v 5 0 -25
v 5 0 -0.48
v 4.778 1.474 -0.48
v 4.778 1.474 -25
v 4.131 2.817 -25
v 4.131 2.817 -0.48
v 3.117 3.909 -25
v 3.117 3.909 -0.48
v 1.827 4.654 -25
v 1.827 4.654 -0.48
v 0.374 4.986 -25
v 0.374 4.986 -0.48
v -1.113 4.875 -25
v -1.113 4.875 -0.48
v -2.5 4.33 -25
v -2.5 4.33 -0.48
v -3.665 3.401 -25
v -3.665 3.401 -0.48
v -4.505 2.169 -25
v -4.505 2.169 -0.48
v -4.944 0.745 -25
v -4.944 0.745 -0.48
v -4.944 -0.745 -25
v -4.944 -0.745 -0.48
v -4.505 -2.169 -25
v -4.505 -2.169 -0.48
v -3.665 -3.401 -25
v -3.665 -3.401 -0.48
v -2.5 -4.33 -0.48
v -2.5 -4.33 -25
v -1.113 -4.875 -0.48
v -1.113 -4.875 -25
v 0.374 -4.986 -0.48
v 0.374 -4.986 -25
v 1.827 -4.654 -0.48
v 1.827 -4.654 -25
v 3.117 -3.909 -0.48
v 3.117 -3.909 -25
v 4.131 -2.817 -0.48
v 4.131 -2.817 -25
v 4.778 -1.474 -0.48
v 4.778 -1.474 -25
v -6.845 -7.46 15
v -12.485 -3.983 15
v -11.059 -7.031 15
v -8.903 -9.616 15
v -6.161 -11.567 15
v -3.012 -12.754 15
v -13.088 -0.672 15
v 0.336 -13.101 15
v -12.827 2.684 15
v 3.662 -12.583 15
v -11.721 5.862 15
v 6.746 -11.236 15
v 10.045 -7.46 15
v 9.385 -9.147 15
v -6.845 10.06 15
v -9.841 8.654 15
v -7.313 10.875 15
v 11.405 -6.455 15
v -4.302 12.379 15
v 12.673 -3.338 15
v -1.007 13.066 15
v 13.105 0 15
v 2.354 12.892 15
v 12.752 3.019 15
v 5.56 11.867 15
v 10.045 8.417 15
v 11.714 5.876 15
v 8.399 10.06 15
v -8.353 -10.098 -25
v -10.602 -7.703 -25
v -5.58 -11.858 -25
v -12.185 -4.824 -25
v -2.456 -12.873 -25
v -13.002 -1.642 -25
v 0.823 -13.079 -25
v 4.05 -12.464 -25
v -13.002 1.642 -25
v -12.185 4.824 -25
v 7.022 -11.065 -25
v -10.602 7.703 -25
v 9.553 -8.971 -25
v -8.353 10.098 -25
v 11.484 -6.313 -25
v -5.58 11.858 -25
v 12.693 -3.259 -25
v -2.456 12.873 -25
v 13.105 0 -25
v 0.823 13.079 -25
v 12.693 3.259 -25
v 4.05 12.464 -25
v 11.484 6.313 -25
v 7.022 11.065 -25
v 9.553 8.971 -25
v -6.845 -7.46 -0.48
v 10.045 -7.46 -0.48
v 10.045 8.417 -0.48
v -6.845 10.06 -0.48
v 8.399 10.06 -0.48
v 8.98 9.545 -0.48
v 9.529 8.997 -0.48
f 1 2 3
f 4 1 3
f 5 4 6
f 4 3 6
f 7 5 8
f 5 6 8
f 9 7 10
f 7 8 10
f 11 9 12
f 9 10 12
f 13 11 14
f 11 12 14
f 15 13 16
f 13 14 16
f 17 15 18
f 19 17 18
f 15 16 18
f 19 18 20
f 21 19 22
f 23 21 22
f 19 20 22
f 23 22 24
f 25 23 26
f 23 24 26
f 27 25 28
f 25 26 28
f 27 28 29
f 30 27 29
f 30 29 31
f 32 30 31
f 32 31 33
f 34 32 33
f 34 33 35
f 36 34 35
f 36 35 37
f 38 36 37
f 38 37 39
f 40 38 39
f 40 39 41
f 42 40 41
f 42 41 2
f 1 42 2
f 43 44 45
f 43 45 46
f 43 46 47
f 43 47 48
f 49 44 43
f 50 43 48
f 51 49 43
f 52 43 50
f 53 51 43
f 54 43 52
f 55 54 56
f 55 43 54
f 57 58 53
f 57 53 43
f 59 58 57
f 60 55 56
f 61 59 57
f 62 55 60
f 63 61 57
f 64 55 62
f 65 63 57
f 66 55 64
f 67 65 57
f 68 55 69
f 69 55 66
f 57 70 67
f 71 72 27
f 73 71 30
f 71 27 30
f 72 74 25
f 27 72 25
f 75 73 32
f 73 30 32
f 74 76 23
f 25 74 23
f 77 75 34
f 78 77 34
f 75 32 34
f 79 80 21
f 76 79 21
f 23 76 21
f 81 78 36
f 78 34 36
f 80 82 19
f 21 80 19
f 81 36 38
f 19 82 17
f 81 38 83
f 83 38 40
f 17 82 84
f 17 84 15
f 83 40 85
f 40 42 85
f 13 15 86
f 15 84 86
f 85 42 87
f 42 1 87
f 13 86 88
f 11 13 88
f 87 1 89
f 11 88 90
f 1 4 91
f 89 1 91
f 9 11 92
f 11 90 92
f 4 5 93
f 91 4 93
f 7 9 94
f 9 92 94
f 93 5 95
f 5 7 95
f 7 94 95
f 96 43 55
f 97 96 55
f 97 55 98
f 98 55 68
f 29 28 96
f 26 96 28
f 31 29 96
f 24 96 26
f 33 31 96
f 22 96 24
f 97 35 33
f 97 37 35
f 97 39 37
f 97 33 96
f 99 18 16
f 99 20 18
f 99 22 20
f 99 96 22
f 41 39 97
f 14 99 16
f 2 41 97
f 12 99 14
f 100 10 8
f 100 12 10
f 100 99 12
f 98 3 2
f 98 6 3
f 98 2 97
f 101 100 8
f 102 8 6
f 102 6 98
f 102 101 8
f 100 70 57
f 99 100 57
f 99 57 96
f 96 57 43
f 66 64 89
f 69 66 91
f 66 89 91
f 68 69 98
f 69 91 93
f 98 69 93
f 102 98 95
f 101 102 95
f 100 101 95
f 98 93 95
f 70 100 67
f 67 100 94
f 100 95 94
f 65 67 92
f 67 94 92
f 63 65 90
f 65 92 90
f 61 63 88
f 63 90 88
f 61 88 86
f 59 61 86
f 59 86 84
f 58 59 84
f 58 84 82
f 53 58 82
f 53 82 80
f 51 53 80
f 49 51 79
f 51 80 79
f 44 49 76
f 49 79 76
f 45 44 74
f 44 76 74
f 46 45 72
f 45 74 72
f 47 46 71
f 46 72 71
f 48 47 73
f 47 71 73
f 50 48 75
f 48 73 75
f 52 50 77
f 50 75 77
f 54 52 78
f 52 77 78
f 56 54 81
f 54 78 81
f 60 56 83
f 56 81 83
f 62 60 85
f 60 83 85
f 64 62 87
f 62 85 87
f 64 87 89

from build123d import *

# Parameters (mm, degrees)
F1_R          = 13.105
F1_R_2        = 5
F2_DEPTH      = 25
F2_DEPTH_BACK = 15
F5_DEPTH      = 15.48


with BuildPart() as f2:
    # F1 (on Top) → F2 (new body, two sides)
    with BuildSketch(Plane.XY) as f2_sk:
        Circle(F1_R)
        Circle(F1_R_2, mode=Mode.SUBTRACT)
    extrude(amount=-F2_DEPTH)
    extrude(f2_sk.sketch, amount=F2_DEPTH_BACK)

    # F4 (on offset) → F5 (cut)
    with BuildSketch(Plane.XY.offset(15)):
        Polygon((10.0449961981, 10.0600004722), (-6.8450038019, 10.0600004722), (-6.8450038019, -5.8399995278), (-6.8450038019, -7.4599995278), (10.0449961981, -7.4599995278), align=None)
    extrude(amount=-F5_DEPTH, mode=Mode.SUBTRACT)


solid = f2.part
